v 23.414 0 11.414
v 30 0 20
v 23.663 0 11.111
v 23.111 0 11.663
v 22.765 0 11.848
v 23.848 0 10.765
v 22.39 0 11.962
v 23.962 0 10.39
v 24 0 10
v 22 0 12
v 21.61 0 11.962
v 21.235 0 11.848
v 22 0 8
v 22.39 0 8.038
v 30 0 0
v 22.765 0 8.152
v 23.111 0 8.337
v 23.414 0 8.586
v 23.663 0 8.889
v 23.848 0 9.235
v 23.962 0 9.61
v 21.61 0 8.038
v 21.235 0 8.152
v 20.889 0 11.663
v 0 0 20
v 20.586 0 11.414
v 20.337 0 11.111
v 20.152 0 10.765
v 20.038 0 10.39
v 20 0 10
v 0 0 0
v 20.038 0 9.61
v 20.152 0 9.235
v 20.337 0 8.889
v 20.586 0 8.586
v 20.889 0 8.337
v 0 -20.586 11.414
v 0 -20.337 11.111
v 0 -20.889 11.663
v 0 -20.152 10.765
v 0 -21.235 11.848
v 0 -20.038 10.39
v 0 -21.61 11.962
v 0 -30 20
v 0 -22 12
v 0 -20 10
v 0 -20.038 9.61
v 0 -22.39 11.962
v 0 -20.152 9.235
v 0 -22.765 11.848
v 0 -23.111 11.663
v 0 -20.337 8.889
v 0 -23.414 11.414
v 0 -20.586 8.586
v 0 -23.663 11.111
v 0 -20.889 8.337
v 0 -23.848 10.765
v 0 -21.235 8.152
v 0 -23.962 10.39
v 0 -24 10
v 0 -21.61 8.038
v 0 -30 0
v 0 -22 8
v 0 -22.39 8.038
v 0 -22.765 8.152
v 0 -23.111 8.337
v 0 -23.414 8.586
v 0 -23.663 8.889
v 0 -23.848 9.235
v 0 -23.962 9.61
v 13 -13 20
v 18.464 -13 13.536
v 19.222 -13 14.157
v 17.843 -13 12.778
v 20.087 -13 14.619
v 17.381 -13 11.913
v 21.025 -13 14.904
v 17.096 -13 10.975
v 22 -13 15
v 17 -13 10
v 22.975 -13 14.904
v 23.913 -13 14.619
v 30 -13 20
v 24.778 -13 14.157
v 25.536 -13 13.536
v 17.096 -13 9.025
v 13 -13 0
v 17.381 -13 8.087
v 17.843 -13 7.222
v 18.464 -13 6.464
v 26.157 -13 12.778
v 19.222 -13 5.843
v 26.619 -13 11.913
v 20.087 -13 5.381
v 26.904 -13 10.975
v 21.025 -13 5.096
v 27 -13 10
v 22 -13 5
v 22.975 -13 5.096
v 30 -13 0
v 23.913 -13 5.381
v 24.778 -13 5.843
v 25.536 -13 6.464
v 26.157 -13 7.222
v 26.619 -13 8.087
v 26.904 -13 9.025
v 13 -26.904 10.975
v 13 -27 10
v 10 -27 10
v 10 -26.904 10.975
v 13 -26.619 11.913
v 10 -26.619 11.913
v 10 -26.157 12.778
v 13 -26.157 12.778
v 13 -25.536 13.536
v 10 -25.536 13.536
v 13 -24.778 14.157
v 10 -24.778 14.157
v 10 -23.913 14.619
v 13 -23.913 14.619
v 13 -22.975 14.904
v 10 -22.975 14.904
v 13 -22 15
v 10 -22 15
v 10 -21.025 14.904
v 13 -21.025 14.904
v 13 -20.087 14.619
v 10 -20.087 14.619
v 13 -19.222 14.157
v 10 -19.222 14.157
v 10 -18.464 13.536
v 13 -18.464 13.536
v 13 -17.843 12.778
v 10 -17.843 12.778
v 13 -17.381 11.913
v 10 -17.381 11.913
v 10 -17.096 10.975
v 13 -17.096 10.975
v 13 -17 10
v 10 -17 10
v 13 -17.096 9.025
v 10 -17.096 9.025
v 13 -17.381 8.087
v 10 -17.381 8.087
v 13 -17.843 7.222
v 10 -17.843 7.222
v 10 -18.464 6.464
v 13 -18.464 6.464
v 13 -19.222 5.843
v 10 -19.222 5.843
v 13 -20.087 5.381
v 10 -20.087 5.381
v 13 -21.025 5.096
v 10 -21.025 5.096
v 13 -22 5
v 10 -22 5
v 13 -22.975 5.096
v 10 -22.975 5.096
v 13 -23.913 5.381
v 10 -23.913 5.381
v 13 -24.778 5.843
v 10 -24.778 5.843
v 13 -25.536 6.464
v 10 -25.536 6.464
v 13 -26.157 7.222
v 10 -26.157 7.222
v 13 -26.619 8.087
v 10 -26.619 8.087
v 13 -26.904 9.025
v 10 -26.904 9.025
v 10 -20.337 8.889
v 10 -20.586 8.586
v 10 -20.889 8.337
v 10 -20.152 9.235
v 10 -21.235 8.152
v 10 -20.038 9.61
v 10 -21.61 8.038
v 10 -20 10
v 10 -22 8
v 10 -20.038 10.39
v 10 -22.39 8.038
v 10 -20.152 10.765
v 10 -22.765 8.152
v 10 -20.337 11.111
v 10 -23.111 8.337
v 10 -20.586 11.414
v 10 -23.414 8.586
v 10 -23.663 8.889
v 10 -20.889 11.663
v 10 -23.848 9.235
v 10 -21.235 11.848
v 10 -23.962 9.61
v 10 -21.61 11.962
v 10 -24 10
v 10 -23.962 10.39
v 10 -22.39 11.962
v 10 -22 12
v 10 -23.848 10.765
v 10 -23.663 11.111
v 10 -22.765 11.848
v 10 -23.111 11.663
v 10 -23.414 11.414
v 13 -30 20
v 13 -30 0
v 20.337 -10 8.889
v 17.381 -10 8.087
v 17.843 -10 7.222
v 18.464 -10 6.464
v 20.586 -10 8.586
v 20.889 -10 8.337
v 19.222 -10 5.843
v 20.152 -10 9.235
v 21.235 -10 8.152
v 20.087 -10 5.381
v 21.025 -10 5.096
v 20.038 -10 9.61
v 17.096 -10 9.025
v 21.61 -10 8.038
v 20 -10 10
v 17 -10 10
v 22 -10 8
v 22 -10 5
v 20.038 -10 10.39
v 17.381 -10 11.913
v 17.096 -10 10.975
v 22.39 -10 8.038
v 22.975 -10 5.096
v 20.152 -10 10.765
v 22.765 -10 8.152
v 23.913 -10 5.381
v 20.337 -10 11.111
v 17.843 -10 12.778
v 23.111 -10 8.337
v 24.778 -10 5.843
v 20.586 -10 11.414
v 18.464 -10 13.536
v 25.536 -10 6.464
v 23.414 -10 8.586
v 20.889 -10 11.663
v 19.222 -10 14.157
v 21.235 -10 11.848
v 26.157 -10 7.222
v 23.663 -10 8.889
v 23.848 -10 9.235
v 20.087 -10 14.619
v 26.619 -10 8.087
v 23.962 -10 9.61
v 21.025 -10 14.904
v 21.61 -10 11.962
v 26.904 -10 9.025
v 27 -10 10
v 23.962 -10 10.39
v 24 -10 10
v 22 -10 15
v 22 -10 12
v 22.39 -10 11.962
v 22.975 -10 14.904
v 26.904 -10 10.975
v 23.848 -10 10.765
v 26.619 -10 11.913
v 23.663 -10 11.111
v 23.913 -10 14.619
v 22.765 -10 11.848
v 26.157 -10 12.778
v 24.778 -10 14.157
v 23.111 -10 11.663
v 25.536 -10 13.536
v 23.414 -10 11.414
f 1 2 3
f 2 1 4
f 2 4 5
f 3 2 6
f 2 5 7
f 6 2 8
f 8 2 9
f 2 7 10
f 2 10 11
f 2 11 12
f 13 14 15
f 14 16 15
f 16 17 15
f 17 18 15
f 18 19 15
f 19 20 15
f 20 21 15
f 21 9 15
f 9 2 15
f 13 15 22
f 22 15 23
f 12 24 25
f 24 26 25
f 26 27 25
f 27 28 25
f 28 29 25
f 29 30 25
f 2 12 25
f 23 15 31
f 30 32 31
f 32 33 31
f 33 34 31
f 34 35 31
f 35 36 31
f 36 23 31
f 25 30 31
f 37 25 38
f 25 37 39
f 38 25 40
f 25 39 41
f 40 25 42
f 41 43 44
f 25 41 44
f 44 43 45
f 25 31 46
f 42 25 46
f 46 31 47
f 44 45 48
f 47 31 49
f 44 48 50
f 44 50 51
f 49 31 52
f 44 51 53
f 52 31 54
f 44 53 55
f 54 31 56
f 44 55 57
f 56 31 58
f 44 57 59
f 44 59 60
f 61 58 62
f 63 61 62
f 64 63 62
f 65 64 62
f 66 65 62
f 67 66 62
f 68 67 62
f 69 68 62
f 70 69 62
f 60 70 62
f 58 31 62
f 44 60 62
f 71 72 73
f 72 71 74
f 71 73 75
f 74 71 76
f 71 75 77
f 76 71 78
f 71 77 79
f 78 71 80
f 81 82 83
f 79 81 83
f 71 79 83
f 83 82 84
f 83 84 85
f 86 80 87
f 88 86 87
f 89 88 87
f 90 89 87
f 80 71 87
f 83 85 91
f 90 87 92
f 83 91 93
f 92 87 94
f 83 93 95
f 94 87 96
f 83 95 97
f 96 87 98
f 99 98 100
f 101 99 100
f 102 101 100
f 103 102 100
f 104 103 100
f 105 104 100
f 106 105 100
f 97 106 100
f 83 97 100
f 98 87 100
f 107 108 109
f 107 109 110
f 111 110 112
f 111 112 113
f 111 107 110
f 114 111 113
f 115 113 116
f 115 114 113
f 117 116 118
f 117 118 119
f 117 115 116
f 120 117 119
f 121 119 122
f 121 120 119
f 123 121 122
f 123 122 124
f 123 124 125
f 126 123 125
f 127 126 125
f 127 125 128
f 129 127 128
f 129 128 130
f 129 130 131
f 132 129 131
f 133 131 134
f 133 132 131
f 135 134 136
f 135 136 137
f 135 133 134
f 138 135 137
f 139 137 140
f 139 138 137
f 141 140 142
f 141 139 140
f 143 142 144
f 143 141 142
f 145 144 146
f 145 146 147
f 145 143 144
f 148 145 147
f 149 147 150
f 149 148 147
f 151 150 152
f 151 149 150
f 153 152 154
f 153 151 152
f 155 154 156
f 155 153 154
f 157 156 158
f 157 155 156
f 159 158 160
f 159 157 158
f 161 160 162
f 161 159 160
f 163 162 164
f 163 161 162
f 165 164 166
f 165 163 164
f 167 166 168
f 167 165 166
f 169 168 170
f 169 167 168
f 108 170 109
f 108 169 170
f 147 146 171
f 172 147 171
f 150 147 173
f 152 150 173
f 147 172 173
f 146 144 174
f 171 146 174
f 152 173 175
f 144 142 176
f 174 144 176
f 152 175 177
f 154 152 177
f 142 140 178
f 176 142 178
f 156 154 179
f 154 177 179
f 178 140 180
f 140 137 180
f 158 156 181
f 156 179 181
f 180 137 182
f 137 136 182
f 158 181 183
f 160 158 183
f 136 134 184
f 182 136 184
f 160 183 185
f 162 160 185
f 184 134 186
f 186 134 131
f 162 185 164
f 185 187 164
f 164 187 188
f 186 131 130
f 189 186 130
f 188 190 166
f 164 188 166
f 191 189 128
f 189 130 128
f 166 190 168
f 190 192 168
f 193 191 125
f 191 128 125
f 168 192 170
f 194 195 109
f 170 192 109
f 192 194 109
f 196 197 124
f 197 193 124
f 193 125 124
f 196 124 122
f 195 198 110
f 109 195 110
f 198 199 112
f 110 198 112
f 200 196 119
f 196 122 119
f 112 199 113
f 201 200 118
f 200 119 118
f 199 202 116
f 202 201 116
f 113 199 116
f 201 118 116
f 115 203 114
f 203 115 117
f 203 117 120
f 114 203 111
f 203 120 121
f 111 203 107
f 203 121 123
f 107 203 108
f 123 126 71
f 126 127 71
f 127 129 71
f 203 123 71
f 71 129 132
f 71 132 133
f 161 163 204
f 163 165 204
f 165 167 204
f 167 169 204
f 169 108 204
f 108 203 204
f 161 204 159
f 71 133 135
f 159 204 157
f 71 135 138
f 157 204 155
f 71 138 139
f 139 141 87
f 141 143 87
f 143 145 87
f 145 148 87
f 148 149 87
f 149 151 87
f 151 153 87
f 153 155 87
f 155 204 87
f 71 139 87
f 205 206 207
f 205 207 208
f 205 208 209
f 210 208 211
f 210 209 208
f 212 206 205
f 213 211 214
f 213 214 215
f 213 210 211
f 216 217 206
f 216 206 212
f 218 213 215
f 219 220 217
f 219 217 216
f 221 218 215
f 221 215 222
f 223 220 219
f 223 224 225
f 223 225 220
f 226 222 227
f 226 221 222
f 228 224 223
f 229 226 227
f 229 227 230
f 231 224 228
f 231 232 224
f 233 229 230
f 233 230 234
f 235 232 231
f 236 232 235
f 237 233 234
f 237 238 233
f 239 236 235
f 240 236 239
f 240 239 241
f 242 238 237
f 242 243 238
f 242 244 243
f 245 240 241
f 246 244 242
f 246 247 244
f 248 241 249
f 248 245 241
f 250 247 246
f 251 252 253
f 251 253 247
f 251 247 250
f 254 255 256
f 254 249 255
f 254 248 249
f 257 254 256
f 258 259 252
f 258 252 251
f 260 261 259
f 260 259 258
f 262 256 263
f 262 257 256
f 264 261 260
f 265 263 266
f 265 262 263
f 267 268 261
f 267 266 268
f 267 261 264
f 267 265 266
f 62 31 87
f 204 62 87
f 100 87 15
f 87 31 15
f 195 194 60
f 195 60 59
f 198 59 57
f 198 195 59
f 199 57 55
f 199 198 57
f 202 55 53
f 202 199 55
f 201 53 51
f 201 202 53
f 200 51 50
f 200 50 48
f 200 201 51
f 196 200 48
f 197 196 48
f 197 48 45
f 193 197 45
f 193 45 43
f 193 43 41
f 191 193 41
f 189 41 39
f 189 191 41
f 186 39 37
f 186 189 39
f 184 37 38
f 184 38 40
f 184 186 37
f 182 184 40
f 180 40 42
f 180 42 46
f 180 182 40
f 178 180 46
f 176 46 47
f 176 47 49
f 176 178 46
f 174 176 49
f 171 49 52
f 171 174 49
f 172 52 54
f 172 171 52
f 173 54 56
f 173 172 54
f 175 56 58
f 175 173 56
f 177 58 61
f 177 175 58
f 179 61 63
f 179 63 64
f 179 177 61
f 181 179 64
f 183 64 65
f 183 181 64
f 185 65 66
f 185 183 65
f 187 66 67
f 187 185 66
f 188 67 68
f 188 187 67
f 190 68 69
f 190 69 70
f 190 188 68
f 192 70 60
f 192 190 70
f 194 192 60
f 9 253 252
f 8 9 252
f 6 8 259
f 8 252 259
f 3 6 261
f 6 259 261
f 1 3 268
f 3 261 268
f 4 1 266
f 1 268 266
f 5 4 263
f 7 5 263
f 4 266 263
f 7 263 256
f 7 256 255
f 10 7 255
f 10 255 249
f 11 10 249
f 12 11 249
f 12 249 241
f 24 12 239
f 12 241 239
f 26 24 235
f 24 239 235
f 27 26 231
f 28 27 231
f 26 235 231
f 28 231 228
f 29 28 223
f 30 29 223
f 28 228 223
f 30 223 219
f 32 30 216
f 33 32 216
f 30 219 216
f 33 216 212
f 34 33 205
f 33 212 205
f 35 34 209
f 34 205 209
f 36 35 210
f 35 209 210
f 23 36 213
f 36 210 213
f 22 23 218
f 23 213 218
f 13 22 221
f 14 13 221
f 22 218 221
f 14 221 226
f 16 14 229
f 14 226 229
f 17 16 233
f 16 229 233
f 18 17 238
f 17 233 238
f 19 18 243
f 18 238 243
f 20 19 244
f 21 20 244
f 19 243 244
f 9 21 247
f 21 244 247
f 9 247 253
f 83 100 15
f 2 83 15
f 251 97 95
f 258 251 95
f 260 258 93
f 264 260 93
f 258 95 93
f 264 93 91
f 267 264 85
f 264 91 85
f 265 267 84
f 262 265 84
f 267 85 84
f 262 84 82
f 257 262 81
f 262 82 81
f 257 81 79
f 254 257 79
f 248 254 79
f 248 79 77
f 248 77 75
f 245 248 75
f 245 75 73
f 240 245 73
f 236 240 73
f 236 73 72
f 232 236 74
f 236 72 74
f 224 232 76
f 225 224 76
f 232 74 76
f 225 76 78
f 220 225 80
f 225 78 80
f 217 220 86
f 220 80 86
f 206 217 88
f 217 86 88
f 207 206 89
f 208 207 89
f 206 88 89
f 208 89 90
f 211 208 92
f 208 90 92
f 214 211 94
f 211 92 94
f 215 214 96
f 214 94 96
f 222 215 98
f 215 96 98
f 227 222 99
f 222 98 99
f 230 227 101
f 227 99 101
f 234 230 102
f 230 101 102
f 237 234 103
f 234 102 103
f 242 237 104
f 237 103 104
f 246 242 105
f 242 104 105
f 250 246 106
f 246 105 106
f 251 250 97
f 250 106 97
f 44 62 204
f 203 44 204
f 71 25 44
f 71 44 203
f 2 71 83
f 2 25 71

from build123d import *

# Parameters (mm, degrees)
F1_DEPTH = 20
F2_R     = 5
F3_DEPTH = 3
F4_R     = 2
F5_DEPTH = 10


# Not quite as in the source:
# - a pattern or mirror of a feature is missing from the dataset's text; its kind, count and spacing are read off the source's solid


with BuildPart() as f1:
    # F0 (on Top) → F1 (new body)
    with BuildSketch(Plane.XY):
        Polygon((30, 0), (0, 0), (0, -30), (13, -30), (13, -13), (30, -13), align=None)
    extrude(amount=F1_DEPTH)

    # F2 (on face) → F3 (cut)
    with BuildSketch(Plane.XZ.offset(13)):
        with Locations((22, 10)):
            Circle(F2_R)
    f3 = extrude(amount=-F3_DEPTH, mode=Mode.SUBTRACT)

    # F3_copies: F3 across plane
    add(f3.mirror(Plane(origin=(0, 0, 0), x_dir=(0.7071067812, -0.7071067812, 0), z_dir=(-0.7071067812, -0.7071067812, 0))), mode=Mode.SUBTRACT)

    # F4 (on face) → F5 (cut, through all)
    with BuildSketch(Plane.XZ.offset(10)):
        with Locations((22, 10)):
            Circle(F4_R)
    f5 = extrude(amount=-F5_DEPTH, mode=Mode.SUBTRACT)

    # F5_copies: F5 across plane
    add(f5.mirror(Plane(origin=(0, 0, 0), x_dir=(-0.7071067812, 0.7071067812, 0), z_dir=(-0.7071067812, -0.7071067812, 0))), mode=Mode.SUBTRACT)


solid = f1.part
